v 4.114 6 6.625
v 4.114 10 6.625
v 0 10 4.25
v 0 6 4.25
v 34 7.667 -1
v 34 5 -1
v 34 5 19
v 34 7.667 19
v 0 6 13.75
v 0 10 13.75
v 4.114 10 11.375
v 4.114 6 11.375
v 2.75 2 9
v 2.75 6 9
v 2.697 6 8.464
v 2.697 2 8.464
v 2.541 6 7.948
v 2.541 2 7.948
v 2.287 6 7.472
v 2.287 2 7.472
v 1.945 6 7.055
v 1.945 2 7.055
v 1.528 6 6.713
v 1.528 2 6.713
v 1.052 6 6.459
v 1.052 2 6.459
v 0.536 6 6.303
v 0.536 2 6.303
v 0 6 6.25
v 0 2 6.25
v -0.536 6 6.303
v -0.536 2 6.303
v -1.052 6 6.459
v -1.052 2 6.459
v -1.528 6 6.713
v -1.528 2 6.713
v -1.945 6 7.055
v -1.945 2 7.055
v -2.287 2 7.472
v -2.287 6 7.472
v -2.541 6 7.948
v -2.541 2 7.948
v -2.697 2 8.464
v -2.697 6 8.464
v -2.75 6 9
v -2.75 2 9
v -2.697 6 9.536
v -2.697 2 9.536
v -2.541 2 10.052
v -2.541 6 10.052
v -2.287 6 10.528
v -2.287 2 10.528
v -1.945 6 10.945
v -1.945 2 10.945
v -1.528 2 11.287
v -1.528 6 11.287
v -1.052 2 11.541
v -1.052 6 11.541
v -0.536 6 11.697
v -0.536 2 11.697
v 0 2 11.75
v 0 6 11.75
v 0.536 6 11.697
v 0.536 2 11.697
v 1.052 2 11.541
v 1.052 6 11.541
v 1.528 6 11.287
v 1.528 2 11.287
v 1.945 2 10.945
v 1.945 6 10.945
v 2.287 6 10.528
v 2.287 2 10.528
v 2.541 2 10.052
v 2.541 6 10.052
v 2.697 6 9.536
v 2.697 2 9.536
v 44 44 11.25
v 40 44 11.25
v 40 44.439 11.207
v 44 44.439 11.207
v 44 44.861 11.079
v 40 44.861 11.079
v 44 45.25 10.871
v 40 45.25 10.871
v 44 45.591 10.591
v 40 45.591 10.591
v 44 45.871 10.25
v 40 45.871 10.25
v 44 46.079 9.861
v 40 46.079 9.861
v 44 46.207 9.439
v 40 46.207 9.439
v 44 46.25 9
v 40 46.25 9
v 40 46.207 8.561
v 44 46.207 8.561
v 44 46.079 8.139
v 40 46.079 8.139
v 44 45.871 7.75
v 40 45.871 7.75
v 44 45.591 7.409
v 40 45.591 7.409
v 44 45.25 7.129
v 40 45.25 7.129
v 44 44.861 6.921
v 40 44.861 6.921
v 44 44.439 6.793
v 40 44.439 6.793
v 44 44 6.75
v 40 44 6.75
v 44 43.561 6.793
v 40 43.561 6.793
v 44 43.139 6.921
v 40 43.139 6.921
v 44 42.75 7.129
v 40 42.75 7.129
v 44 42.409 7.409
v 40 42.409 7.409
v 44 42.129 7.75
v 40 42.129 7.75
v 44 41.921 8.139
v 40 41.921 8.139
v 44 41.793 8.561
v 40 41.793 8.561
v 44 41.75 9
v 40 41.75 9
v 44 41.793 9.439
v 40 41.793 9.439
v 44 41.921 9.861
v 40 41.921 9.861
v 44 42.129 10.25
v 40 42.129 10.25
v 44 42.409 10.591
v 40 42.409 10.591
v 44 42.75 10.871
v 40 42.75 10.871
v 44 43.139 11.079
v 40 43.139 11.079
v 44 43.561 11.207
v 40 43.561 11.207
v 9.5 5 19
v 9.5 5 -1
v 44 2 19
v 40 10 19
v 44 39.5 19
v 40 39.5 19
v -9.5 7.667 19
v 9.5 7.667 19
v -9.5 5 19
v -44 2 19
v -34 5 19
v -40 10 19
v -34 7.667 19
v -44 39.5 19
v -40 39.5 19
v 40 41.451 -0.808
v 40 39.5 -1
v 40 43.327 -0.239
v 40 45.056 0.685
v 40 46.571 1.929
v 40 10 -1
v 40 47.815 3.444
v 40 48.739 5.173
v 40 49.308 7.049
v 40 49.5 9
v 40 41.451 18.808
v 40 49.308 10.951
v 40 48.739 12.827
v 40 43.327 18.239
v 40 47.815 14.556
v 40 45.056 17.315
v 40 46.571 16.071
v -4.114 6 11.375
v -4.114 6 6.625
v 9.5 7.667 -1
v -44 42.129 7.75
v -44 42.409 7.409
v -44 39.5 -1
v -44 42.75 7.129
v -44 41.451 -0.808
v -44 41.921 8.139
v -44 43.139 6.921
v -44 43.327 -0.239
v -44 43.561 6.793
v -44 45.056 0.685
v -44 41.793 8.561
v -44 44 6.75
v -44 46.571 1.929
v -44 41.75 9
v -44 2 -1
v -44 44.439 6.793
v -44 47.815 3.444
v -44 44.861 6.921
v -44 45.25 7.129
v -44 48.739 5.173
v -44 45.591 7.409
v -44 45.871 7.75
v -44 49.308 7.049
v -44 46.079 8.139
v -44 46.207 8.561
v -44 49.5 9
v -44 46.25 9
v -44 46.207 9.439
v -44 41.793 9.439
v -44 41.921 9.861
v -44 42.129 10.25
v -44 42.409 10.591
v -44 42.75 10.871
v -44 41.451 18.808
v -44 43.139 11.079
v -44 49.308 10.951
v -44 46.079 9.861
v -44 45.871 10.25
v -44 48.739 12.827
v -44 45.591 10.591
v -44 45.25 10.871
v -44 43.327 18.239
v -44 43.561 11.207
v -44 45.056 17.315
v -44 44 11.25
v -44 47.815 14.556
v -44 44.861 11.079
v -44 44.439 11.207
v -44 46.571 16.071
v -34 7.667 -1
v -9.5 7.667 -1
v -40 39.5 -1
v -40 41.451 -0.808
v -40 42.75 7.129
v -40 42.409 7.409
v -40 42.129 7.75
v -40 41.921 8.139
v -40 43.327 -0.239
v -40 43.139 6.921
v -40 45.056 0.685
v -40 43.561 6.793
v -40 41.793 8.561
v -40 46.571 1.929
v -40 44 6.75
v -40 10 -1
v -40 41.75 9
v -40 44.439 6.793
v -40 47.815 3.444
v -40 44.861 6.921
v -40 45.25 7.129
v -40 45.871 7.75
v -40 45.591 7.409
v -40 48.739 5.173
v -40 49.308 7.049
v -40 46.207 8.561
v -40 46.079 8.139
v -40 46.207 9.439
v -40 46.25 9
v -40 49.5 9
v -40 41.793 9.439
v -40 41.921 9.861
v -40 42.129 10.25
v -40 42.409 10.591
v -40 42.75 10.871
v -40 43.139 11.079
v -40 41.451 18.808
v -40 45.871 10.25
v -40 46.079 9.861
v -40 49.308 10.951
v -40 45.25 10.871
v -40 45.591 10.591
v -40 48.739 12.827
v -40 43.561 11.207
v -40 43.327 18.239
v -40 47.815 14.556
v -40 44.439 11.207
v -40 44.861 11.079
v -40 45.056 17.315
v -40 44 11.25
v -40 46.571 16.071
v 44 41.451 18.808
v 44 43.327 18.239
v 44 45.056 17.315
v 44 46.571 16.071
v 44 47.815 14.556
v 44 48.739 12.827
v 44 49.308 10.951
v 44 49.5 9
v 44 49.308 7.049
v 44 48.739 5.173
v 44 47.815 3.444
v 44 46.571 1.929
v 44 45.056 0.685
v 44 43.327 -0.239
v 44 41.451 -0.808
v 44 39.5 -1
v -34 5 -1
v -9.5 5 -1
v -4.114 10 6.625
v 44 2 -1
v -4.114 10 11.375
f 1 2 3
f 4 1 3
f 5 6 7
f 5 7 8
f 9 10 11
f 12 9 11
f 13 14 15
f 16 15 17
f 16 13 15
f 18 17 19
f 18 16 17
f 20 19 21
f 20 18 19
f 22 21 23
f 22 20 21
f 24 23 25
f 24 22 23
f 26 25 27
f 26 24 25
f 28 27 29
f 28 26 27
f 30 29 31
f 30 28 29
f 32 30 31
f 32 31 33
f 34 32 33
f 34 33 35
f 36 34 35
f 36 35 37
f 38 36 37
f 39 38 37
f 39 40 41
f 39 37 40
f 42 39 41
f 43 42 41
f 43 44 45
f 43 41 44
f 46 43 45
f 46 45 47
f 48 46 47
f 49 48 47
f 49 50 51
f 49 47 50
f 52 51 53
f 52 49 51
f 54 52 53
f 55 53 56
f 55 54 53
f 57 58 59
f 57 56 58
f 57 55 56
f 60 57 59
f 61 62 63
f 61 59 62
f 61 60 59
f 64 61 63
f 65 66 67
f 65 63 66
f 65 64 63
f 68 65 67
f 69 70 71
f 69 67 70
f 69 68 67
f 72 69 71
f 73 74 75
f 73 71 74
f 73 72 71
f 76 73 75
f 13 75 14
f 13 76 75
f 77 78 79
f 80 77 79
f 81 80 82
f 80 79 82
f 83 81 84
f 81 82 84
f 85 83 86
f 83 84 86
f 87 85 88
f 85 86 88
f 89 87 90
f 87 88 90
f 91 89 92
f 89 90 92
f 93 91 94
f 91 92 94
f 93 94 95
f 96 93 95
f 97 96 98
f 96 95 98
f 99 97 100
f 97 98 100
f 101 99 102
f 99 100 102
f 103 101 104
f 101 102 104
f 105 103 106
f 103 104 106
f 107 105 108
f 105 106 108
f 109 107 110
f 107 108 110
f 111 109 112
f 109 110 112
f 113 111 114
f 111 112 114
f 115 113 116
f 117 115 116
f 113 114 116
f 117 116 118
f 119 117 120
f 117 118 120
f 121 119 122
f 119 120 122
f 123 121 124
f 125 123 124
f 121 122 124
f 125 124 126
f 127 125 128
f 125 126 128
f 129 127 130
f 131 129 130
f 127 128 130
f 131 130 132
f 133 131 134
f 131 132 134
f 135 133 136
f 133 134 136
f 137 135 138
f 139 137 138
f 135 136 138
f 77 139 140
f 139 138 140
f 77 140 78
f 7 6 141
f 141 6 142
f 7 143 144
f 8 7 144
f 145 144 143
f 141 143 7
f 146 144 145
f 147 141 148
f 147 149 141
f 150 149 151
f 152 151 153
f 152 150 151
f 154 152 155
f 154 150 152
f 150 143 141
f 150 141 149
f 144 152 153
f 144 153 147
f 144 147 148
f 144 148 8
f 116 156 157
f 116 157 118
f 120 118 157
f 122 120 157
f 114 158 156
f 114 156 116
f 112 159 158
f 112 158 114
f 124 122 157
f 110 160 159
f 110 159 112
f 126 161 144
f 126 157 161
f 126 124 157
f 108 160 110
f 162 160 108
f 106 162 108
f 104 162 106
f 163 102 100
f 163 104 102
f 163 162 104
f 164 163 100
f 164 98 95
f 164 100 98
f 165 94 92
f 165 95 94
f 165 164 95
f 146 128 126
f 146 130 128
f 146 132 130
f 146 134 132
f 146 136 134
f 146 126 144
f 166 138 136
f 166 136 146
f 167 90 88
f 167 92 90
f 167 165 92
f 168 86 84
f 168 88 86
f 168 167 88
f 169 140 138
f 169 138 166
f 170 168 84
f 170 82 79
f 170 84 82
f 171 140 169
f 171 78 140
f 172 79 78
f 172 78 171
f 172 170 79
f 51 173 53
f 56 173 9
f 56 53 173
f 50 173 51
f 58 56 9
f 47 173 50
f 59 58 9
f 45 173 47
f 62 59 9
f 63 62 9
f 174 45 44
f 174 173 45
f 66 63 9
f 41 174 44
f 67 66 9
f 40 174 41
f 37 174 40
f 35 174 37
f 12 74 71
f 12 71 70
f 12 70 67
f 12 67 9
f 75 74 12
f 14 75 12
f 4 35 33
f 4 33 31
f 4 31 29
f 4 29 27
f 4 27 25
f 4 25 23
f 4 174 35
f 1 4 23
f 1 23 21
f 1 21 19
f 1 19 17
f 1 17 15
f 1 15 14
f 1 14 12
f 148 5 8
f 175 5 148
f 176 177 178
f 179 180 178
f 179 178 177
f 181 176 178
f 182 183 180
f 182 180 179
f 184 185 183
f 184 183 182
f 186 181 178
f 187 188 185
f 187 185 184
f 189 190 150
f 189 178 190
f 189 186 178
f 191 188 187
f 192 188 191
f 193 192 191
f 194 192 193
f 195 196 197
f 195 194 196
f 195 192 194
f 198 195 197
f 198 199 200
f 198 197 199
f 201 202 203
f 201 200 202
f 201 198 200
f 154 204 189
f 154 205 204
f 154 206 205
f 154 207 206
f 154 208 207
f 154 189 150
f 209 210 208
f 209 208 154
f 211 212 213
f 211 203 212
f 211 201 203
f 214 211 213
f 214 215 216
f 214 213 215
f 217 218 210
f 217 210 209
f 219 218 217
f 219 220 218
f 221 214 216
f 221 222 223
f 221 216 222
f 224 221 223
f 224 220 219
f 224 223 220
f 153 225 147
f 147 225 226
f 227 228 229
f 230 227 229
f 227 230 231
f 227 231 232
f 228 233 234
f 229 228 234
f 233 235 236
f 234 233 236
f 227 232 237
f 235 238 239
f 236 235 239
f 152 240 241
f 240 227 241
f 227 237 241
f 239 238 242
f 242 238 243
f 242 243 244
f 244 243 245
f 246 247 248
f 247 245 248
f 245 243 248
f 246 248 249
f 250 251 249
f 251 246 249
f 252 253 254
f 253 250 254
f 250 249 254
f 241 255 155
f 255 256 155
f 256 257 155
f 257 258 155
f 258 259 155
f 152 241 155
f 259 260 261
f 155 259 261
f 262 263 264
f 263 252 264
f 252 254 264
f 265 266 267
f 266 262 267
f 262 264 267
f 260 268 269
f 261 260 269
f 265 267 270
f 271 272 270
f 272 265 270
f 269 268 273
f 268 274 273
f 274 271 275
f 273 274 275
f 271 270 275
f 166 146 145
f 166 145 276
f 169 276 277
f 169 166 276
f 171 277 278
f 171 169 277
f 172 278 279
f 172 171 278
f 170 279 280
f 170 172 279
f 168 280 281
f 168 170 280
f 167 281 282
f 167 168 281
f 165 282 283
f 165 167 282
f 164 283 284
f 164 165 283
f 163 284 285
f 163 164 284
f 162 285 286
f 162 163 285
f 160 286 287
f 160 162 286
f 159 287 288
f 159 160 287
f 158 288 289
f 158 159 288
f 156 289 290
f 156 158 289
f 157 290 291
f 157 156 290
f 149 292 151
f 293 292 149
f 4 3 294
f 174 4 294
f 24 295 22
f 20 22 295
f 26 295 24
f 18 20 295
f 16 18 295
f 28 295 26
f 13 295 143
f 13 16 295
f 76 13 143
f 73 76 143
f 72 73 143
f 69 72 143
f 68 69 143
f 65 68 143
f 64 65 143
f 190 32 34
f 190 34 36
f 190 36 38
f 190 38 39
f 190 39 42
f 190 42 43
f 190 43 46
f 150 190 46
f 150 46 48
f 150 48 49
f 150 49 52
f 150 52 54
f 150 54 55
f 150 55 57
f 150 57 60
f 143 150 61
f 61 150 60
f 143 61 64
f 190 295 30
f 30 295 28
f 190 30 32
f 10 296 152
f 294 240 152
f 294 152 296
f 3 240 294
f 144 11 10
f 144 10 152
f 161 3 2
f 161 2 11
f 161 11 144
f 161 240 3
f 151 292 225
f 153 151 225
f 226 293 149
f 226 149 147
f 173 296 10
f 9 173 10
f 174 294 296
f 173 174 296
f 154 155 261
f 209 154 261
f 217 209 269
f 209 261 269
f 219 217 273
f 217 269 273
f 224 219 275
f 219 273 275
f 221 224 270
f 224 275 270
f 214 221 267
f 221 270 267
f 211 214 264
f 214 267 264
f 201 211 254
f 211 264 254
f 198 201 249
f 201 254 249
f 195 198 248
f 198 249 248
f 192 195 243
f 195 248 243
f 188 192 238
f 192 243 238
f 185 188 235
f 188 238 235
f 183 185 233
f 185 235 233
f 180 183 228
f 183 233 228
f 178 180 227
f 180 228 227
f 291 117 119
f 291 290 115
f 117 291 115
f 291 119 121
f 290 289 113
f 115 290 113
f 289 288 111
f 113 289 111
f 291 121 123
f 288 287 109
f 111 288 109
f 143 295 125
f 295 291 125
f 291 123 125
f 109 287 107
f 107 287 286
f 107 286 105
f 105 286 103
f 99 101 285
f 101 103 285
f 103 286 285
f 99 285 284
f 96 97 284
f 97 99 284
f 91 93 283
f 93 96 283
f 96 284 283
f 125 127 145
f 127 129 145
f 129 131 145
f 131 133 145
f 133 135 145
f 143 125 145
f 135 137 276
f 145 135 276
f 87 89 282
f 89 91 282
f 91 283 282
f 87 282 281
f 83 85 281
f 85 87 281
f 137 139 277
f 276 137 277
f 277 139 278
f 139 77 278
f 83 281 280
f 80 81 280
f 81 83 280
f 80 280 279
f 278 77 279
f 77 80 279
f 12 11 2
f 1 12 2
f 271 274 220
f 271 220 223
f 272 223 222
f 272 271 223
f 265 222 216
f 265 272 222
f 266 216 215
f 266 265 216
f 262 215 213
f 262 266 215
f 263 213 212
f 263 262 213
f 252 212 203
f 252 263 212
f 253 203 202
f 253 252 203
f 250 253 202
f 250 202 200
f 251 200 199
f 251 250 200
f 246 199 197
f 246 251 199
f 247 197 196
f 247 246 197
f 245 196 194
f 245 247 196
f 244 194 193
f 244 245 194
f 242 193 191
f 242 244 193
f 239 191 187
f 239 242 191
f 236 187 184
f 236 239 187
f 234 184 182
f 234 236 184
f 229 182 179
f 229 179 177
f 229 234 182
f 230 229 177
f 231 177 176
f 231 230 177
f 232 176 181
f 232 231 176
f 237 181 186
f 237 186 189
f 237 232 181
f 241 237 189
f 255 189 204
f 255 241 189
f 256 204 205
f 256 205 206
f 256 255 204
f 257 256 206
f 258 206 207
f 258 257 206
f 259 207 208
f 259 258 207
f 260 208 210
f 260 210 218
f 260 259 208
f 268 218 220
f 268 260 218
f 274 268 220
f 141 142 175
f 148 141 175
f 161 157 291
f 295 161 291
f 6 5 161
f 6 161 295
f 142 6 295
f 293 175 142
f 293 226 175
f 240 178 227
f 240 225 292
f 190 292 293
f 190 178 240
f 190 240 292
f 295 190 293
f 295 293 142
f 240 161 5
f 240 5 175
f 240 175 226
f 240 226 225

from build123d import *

# Parameters (mm, degrees)
SKETCH005_W             = 80
SKETCH005_H             = 20
SKETCH005_R             = 2.75
PAD010_DEPTH            = 8
POCKET009_DEPTH         = 4
SKETCH011_W             = 24.5
SKETCH011_H             = 2.666667
POCKET010_DEPTH         = 185.699521
SKETCH017_R             = 2.25
PAD011_DEPTH            = 4
BODY002_PLACEMENT_ANGLE = 180


with BuildPart() as part:
    # Sketch005 → Pad010 (new body)
    with BuildSketch(Plane.XZ):
        Rectangle(SKETCH005_W, SKETCH005_H)
        Circle(SKETCH005_R, mode=Mode.SUBTRACT)
    extrude(amount=PAD010_DEPTH)

    # Sketch007 → Pocket009 (cut)
    with BuildSketch(Plane.XZ.offset(8)):
        Polygon((4.113621, 2.375), (0, 4.75), (-4.113621, 2.375), (-4.113621, -2.375), (0, -4.75), (4.113621, -2.375), align=None)
    extrude(amount=-POCKET009_DEPTH, mode=Mode.SUBTRACT)

    # Sketch011 → Pocket010 (cut, through all)
    with BuildSketch(Plane(origin=(0, 0, 10), x_dir=(-1, 0, 0), z_dir=(0, 0, 1))):
        with Locations((-21.75, 4.333334)):
            Rectangle(SKETCH011_W, SKETCH011_H)
    pocket010 = extrude(amount=-POCKET010_DEPTH, mode=Mode.SUBTRACT)

    # Sketch017 (on Face4 of Pad010) → Pad011 (join)
    with BuildSketch(Plane(origin=(-40, 0, 0), x_dir=(0, 0, -1), z_dir=(-1, 0, 0))):
        with BuildLine():
            Line((-10, 0), (10, 0))
            Line((10, 0), (10, 37.5))
            ThreePointArc((10, 37.5), (0, 47.5), (-10, 37.5))
            Line((-10, 37.5), (-10, 0))
        make_face()
        with Locations((0, 42)):
            Circle(SKETCH017_R, mode=Mode.SUBTRACT)
    pad011 = extrude(amount=PAD011_DEPTH)

    # Mirrored007: Pad011 across YZ
    add(pad011.mirror(Plane.YZ))

    # Mirrored008: Pocket010 across YZ
    add(pocket010.mirror(Plane.YZ), mode=Mode.SUBTRACT)


with BuildPart() as part_1:
    # Body002 placement: moved
    add(part.part.moved(Location((0, 2, 9))).rotate(Axis((0, 2, 9), (1, 0, 0)), BODY002_PLACEMENT_ANGLE))


solid = part_1.part
